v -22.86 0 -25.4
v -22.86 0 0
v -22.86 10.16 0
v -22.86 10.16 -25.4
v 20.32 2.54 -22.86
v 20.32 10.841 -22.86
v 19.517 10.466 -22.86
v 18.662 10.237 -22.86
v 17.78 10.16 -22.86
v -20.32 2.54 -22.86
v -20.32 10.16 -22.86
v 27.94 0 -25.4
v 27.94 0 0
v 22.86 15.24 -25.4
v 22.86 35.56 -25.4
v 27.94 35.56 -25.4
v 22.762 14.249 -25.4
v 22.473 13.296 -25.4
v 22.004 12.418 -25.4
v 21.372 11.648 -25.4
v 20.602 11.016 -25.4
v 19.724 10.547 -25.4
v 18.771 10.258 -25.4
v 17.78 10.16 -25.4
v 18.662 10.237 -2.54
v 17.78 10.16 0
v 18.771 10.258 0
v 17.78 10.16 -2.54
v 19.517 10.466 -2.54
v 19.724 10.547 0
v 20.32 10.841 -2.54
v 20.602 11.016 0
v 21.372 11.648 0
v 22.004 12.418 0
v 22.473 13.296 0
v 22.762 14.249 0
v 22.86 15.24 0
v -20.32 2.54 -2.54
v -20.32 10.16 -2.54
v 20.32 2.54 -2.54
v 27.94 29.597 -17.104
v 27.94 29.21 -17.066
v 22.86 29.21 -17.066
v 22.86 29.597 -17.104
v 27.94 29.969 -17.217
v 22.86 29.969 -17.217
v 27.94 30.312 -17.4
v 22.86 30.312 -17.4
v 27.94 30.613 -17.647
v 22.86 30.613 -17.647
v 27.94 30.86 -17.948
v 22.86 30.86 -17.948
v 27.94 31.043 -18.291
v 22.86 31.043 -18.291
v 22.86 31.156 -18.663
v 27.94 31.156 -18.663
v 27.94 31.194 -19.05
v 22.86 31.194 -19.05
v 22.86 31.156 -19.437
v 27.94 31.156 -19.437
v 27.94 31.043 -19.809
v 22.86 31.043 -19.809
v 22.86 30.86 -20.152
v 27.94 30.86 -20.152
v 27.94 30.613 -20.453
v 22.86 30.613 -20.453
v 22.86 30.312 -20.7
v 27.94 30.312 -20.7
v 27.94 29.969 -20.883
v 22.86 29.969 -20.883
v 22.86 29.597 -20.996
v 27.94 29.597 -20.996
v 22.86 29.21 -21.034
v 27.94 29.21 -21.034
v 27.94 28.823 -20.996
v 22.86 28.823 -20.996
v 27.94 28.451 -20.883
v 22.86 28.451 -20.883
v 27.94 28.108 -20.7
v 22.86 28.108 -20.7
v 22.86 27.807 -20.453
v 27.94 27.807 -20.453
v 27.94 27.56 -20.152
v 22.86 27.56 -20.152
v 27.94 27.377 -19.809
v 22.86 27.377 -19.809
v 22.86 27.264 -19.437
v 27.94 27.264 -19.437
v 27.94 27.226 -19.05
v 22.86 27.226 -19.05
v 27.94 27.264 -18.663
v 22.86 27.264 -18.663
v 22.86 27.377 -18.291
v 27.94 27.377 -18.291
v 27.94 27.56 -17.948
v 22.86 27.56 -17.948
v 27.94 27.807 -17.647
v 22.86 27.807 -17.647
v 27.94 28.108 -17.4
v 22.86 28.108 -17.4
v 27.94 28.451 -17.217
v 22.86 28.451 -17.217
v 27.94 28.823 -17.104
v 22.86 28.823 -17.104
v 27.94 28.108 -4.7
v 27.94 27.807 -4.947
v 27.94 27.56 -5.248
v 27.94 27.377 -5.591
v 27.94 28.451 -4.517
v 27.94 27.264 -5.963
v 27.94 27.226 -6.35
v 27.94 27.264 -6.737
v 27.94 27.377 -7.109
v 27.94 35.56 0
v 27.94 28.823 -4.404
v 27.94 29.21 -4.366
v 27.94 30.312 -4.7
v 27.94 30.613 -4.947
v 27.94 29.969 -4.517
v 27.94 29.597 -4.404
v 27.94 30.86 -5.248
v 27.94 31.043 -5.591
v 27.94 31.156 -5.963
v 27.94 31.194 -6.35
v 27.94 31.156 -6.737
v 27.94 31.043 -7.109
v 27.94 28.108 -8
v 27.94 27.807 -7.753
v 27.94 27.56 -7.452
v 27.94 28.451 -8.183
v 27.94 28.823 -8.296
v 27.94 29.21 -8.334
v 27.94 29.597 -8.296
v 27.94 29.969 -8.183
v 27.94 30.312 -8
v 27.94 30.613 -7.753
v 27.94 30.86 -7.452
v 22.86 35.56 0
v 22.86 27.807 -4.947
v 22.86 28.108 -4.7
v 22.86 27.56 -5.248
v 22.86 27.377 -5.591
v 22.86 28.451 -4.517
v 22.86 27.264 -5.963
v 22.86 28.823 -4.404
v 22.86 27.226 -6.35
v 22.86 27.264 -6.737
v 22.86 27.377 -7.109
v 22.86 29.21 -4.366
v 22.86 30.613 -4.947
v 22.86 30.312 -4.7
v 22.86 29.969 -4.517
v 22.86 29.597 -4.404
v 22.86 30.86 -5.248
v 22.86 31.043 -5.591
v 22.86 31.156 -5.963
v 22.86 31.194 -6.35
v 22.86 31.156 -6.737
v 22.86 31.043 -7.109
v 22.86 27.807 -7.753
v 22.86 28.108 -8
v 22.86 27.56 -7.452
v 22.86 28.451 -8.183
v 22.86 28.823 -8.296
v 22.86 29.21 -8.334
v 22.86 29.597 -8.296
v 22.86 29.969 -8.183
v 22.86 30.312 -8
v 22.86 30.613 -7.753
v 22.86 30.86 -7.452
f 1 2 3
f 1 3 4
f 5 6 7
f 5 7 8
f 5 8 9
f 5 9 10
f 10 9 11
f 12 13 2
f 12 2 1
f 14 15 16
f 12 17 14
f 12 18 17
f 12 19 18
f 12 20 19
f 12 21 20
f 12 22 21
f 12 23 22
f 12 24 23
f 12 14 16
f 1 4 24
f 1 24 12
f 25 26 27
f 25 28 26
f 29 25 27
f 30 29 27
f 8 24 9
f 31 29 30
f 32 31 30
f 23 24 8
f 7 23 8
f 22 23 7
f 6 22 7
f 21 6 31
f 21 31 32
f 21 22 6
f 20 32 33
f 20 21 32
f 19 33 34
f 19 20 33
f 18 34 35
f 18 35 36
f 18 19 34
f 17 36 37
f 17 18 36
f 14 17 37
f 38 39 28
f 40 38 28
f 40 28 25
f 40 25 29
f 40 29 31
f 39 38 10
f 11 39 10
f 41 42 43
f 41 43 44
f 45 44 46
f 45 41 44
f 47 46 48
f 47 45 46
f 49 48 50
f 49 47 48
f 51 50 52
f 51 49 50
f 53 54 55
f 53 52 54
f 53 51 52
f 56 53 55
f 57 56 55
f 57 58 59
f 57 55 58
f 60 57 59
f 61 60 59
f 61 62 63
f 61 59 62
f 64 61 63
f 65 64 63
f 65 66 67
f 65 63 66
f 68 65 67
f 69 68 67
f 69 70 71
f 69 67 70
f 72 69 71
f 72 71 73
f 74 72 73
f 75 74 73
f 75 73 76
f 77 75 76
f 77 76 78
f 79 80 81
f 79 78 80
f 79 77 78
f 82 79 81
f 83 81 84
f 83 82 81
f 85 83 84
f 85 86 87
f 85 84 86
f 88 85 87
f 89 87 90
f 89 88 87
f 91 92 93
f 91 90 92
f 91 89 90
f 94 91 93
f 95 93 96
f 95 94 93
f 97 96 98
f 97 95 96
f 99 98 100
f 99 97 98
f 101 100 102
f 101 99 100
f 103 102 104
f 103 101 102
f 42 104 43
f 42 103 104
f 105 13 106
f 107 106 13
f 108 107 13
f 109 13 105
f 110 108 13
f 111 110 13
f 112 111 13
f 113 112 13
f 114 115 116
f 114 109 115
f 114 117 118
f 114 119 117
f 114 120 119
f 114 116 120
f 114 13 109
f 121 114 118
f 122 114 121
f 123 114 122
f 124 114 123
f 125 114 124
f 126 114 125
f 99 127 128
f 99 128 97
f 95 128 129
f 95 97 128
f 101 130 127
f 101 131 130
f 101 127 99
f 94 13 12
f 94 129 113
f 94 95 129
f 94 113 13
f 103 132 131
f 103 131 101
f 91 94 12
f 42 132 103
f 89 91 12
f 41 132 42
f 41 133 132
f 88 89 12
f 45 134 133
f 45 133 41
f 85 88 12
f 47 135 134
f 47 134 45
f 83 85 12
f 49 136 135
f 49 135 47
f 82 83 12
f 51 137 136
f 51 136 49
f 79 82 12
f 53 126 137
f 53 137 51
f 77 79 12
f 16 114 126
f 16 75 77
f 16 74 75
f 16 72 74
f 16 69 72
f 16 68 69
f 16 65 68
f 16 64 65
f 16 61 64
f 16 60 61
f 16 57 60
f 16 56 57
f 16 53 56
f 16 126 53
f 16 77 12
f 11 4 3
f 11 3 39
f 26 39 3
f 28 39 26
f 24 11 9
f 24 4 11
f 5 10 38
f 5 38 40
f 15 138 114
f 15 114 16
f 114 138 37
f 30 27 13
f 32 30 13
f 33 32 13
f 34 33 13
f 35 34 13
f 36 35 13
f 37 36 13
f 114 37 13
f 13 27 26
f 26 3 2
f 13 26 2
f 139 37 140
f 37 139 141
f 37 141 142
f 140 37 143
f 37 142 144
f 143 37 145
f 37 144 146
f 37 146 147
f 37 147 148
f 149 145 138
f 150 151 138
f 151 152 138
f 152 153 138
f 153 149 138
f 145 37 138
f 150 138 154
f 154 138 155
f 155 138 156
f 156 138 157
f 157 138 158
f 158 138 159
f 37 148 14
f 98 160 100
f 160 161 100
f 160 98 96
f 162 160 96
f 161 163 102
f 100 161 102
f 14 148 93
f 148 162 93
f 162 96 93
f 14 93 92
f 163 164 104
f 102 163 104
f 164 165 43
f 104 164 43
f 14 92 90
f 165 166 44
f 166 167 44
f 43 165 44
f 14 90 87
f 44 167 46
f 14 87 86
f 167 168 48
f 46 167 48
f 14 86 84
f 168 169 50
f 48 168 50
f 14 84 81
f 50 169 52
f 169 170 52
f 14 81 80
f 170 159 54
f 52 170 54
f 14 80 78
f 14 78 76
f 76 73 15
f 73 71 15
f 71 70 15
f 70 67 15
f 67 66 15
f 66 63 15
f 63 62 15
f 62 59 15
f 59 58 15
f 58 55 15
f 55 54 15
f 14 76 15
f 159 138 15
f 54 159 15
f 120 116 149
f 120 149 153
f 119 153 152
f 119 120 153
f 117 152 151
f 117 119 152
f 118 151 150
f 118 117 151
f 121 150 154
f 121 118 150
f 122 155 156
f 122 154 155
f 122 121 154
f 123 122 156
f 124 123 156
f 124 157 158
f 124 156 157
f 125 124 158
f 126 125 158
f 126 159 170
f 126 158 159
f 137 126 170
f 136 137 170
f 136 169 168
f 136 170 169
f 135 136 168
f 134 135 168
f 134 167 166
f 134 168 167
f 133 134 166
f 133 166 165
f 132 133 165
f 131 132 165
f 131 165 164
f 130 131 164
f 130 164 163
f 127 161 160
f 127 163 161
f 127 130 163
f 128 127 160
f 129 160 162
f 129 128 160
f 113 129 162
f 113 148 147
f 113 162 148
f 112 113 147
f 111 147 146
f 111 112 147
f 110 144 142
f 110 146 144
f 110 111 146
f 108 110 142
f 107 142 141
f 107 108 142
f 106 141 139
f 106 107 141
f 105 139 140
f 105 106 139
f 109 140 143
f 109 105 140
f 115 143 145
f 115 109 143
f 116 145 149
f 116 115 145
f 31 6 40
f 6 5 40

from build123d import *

# Parameters (mm, degrees)
SKETCH1_W               = 45.72
SKETCH1_H               = 25.4
BOSS_EXTRUDE1_DEPTH     = 10.16
SHELL1_T                = -2.54
SKETCH2_W               = 25.4
SKETCH2_H               = 35.56
BOSS_EXTRUDE2_DEPTH     = 5.08
FILLET1_R               = 5.08
CUT_EXTRUDE1_DEPTH      = 64.245489958
CUT_EXTRUDE1_DEPTH_BACK = 64.245489958
SKETCH3_R               = 1.984375


with BuildPart() as part:
    # Sketch1 → Boss-Extrude1 (new body)
    with BuildSketch(Plane(origin=(0, 0, 0), x_dir=(1, 0, 0), z_dir=(0, 1, 0))):
        with Locations((0, 12.7)):
            Rectangle(SKETCH1_W, SKETCH1_H)
    extrude(amount=BOSS_EXTRUDE1_DEPTH)

    # Shell1
    shell1_openings = [part.faces().sort_by_distance(p)[0] for p in [
        (0, 10.16, -12.7),
    ]]
    offset(amount=SHELL1_T, openings=shell1_openings, kind=Kind.INTERSECTION)

    # Sketch2 → Boss-Extrude2 (add)
    with BuildSketch(Plane(origin=(22.86, 0, 0), x_dir=(0, 0, -1), z_dir=(1, 0, 0))):
        with Locations((12.7, 17.78)):
            Rectangle(SKETCH2_W, SKETCH2_H)
    extrude(amount=BOSS_EXTRUDE2_DEPTH)

    # Fillet1
    # the kernel refuses this fillet: 5.08 mm, written as the material it adds along each edge
    with BuildSketch(Plane(origin=(22.86, 10.16, -25.4), x_dir=(0, 1, 0), z_dir=(0, 0, 1))) as fillet1_piece_1_section:
        with BuildLine():
            CenterArc((FILLET1_R, FILLET1_R), FILLET1_R, 180, 90)
            Line((0, FILLET1_R), (0, 0))
            Line((0, 0), (FILLET1_R, 0))
        make_face()
    fillet1_piece_1 = extrude(amount=25.4, mode=Mode.PRIVATE)
    fillet1_piece_1 = split(fillet1_piece_1, bisect_by=Plane(origin=(22.024889837, 11.456009905, -22.86), z_dir=(0, 0, -1)), keep=Keep.TOP, mode=Mode.PRIVATE)
    fillet1_piece_1 = split(fillet1_piece_1, bisect_by=Plane(origin=(20.32, 11.456009905, -24.13), z_dir=(1, 0, 0)), keep=Keep.TOP, mode=Mode.PRIVATE)
    add(fillet1_piece_1)
    with BuildSketch(Plane(origin=(22.86, 10.16, -25.4), x_dir=(0, 1, 0), z_dir=(0, 0, 1))) as fillet1_piece_2_section:
        with BuildLine():
            CenterArc((FILLET1_R, FILLET1_R), FILLET1_R, 180, 90)
            Line((0, FILLET1_R), (0, 0))
            Line((0, 0), (FILLET1_R, 0))
        make_face()
    fillet1_piece_2 = extrude(amount=25.4, mode=Mode.PRIVATE)
    fillet1_piece_2 = split(fillet1_piece_2, bisect_by=Plane(origin=(19.490686015, 10.281962579, -22.86), z_dir=(0, 0, -1)), keep=Keep.TOP, mode=Mode.PRIVATE)
    fillet1_piece_2 = split(fillet1_piece_2, bisect_by=Plane(origin=(20.32, 10.281962579, -24.13), z_dir=(-1, 0, 0)), keep=Keep.TOP, mode=Mode.PRIVATE)
    add(fillet1_piece_2)
    with BuildSketch(Plane(origin=(22.86, 10.16, -25.4), x_dir=(0, 1, 0), z_dir=(0, 0, 1))) as fillet1_piece_3_section:
        with BuildLine():
            CenterArc((FILLET1_R, FILLET1_R), FILLET1_R, 180, 90)
            Line((0, FILLET1_R), (0, 0))
            Line((0, 0), (FILLET1_R, 0))
        make_face()
    fillet1_piece_3 = extrude(amount=25.4, mode=Mode.PRIVATE)
    fillet1_piece_3 = split(fillet1_piece_3, bisect_by=Plane(origin=(22.024889837, 11.456009905, -22.86), z_dir=(0, 0, 1)), keep=Keep.TOP, mode=Mode.PRIVATE)
    fillet1_piece_3 = split(fillet1_piece_3, bisect_by=Plane(origin=(22.024889837, 11.456009905, -2.54), z_dir=(0, 0, -1)), keep=Keep.TOP, mode=Mode.PRIVATE)
    fillet1_piece_3 = split(fillet1_piece_3, bisect_by=Plane(origin=(20.32, 11.456009905, -12.7), z_dir=(1, 0, 0)), keep=Keep.TOP, mode=Mode.PRIVATE)
    add(fillet1_piece_3)
    with BuildSketch(Plane(origin=(22.86, 10.16, -25.4), x_dir=(0, 1, 0), z_dir=(0, 0, 1))) as fillet1_piece_4_section:
        with BuildLine():
            CenterArc((FILLET1_R, FILLET1_R), FILLET1_R, 180, 90)
            Line((0, FILLET1_R), (0, 0))
            Line((0, 0), (FILLET1_R, 0))
        make_face()
    fillet1_piece_4 = extrude(amount=25.4, mode=Mode.PRIVATE)
    fillet1_piece_4 = split(fillet1_piece_4, bisect_by=Plane(origin=(22.024889837, 11.456009905, -2.54), z_dir=(0, 0, 1)), keep=Keep.TOP, mode=Mode.PRIVATE)
    fillet1_piece_4 = split(fillet1_piece_4, bisect_by=Plane(origin=(20.32, 11.456009905, -1.27), z_dir=(1, 0, 0)), keep=Keep.TOP, mode=Mode.PRIVATE)
    add(fillet1_piece_4)
    with BuildSketch(Plane(origin=(22.86, 10.16, -25.4), x_dir=(0, 1, 0), z_dir=(0, 0, 1))) as fillet1_piece_5_section:
        with BuildLine():
            CenterArc((FILLET1_R, FILLET1_R), FILLET1_R, 180, 90)
            Line((0, FILLET1_R), (0, 0))
            Line((0, 0), (FILLET1_R, 0))
        make_face()
    fillet1_piece_5 = extrude(amount=25.4, mode=Mode.PRIVATE)
    fillet1_piece_5 = split(fillet1_piece_5, bisect_by=Plane(origin=(19.490686015, 10.281962579, -2.54), z_dir=(0, 0, 1)), keep=Keep.TOP, mode=Mode.PRIVATE)
    fillet1_piece_5 = split(fillet1_piece_5, bisect_by=Plane(origin=(20.32, 10.281962579, -1.27), z_dir=(-1, 0, 0)), keep=Keep.TOP, mode=Mode.PRIVATE)
    add(fillet1_piece_5)

    # Sketch3 → Cut-Extrude1 (cut, two sides: drawn at the far end of the back side and taken through both)
    with BuildSketch(Plane.ZY.offset(-22.86).offset(-CUT_EXTRUDE1_DEPTH_BACK)):
        with Locations((-19.05, 29.21)):
            Circle(SKETCH3_R)
        with Locations((-6.35, 29.21)):
            Circle(SKETCH3_R)
    extrude(amount=CUT_EXTRUDE1_DEPTH + CUT_EXTRUDE1_DEPTH_BACK, mode=Mode.SUBTRACT)


solid = part.part
